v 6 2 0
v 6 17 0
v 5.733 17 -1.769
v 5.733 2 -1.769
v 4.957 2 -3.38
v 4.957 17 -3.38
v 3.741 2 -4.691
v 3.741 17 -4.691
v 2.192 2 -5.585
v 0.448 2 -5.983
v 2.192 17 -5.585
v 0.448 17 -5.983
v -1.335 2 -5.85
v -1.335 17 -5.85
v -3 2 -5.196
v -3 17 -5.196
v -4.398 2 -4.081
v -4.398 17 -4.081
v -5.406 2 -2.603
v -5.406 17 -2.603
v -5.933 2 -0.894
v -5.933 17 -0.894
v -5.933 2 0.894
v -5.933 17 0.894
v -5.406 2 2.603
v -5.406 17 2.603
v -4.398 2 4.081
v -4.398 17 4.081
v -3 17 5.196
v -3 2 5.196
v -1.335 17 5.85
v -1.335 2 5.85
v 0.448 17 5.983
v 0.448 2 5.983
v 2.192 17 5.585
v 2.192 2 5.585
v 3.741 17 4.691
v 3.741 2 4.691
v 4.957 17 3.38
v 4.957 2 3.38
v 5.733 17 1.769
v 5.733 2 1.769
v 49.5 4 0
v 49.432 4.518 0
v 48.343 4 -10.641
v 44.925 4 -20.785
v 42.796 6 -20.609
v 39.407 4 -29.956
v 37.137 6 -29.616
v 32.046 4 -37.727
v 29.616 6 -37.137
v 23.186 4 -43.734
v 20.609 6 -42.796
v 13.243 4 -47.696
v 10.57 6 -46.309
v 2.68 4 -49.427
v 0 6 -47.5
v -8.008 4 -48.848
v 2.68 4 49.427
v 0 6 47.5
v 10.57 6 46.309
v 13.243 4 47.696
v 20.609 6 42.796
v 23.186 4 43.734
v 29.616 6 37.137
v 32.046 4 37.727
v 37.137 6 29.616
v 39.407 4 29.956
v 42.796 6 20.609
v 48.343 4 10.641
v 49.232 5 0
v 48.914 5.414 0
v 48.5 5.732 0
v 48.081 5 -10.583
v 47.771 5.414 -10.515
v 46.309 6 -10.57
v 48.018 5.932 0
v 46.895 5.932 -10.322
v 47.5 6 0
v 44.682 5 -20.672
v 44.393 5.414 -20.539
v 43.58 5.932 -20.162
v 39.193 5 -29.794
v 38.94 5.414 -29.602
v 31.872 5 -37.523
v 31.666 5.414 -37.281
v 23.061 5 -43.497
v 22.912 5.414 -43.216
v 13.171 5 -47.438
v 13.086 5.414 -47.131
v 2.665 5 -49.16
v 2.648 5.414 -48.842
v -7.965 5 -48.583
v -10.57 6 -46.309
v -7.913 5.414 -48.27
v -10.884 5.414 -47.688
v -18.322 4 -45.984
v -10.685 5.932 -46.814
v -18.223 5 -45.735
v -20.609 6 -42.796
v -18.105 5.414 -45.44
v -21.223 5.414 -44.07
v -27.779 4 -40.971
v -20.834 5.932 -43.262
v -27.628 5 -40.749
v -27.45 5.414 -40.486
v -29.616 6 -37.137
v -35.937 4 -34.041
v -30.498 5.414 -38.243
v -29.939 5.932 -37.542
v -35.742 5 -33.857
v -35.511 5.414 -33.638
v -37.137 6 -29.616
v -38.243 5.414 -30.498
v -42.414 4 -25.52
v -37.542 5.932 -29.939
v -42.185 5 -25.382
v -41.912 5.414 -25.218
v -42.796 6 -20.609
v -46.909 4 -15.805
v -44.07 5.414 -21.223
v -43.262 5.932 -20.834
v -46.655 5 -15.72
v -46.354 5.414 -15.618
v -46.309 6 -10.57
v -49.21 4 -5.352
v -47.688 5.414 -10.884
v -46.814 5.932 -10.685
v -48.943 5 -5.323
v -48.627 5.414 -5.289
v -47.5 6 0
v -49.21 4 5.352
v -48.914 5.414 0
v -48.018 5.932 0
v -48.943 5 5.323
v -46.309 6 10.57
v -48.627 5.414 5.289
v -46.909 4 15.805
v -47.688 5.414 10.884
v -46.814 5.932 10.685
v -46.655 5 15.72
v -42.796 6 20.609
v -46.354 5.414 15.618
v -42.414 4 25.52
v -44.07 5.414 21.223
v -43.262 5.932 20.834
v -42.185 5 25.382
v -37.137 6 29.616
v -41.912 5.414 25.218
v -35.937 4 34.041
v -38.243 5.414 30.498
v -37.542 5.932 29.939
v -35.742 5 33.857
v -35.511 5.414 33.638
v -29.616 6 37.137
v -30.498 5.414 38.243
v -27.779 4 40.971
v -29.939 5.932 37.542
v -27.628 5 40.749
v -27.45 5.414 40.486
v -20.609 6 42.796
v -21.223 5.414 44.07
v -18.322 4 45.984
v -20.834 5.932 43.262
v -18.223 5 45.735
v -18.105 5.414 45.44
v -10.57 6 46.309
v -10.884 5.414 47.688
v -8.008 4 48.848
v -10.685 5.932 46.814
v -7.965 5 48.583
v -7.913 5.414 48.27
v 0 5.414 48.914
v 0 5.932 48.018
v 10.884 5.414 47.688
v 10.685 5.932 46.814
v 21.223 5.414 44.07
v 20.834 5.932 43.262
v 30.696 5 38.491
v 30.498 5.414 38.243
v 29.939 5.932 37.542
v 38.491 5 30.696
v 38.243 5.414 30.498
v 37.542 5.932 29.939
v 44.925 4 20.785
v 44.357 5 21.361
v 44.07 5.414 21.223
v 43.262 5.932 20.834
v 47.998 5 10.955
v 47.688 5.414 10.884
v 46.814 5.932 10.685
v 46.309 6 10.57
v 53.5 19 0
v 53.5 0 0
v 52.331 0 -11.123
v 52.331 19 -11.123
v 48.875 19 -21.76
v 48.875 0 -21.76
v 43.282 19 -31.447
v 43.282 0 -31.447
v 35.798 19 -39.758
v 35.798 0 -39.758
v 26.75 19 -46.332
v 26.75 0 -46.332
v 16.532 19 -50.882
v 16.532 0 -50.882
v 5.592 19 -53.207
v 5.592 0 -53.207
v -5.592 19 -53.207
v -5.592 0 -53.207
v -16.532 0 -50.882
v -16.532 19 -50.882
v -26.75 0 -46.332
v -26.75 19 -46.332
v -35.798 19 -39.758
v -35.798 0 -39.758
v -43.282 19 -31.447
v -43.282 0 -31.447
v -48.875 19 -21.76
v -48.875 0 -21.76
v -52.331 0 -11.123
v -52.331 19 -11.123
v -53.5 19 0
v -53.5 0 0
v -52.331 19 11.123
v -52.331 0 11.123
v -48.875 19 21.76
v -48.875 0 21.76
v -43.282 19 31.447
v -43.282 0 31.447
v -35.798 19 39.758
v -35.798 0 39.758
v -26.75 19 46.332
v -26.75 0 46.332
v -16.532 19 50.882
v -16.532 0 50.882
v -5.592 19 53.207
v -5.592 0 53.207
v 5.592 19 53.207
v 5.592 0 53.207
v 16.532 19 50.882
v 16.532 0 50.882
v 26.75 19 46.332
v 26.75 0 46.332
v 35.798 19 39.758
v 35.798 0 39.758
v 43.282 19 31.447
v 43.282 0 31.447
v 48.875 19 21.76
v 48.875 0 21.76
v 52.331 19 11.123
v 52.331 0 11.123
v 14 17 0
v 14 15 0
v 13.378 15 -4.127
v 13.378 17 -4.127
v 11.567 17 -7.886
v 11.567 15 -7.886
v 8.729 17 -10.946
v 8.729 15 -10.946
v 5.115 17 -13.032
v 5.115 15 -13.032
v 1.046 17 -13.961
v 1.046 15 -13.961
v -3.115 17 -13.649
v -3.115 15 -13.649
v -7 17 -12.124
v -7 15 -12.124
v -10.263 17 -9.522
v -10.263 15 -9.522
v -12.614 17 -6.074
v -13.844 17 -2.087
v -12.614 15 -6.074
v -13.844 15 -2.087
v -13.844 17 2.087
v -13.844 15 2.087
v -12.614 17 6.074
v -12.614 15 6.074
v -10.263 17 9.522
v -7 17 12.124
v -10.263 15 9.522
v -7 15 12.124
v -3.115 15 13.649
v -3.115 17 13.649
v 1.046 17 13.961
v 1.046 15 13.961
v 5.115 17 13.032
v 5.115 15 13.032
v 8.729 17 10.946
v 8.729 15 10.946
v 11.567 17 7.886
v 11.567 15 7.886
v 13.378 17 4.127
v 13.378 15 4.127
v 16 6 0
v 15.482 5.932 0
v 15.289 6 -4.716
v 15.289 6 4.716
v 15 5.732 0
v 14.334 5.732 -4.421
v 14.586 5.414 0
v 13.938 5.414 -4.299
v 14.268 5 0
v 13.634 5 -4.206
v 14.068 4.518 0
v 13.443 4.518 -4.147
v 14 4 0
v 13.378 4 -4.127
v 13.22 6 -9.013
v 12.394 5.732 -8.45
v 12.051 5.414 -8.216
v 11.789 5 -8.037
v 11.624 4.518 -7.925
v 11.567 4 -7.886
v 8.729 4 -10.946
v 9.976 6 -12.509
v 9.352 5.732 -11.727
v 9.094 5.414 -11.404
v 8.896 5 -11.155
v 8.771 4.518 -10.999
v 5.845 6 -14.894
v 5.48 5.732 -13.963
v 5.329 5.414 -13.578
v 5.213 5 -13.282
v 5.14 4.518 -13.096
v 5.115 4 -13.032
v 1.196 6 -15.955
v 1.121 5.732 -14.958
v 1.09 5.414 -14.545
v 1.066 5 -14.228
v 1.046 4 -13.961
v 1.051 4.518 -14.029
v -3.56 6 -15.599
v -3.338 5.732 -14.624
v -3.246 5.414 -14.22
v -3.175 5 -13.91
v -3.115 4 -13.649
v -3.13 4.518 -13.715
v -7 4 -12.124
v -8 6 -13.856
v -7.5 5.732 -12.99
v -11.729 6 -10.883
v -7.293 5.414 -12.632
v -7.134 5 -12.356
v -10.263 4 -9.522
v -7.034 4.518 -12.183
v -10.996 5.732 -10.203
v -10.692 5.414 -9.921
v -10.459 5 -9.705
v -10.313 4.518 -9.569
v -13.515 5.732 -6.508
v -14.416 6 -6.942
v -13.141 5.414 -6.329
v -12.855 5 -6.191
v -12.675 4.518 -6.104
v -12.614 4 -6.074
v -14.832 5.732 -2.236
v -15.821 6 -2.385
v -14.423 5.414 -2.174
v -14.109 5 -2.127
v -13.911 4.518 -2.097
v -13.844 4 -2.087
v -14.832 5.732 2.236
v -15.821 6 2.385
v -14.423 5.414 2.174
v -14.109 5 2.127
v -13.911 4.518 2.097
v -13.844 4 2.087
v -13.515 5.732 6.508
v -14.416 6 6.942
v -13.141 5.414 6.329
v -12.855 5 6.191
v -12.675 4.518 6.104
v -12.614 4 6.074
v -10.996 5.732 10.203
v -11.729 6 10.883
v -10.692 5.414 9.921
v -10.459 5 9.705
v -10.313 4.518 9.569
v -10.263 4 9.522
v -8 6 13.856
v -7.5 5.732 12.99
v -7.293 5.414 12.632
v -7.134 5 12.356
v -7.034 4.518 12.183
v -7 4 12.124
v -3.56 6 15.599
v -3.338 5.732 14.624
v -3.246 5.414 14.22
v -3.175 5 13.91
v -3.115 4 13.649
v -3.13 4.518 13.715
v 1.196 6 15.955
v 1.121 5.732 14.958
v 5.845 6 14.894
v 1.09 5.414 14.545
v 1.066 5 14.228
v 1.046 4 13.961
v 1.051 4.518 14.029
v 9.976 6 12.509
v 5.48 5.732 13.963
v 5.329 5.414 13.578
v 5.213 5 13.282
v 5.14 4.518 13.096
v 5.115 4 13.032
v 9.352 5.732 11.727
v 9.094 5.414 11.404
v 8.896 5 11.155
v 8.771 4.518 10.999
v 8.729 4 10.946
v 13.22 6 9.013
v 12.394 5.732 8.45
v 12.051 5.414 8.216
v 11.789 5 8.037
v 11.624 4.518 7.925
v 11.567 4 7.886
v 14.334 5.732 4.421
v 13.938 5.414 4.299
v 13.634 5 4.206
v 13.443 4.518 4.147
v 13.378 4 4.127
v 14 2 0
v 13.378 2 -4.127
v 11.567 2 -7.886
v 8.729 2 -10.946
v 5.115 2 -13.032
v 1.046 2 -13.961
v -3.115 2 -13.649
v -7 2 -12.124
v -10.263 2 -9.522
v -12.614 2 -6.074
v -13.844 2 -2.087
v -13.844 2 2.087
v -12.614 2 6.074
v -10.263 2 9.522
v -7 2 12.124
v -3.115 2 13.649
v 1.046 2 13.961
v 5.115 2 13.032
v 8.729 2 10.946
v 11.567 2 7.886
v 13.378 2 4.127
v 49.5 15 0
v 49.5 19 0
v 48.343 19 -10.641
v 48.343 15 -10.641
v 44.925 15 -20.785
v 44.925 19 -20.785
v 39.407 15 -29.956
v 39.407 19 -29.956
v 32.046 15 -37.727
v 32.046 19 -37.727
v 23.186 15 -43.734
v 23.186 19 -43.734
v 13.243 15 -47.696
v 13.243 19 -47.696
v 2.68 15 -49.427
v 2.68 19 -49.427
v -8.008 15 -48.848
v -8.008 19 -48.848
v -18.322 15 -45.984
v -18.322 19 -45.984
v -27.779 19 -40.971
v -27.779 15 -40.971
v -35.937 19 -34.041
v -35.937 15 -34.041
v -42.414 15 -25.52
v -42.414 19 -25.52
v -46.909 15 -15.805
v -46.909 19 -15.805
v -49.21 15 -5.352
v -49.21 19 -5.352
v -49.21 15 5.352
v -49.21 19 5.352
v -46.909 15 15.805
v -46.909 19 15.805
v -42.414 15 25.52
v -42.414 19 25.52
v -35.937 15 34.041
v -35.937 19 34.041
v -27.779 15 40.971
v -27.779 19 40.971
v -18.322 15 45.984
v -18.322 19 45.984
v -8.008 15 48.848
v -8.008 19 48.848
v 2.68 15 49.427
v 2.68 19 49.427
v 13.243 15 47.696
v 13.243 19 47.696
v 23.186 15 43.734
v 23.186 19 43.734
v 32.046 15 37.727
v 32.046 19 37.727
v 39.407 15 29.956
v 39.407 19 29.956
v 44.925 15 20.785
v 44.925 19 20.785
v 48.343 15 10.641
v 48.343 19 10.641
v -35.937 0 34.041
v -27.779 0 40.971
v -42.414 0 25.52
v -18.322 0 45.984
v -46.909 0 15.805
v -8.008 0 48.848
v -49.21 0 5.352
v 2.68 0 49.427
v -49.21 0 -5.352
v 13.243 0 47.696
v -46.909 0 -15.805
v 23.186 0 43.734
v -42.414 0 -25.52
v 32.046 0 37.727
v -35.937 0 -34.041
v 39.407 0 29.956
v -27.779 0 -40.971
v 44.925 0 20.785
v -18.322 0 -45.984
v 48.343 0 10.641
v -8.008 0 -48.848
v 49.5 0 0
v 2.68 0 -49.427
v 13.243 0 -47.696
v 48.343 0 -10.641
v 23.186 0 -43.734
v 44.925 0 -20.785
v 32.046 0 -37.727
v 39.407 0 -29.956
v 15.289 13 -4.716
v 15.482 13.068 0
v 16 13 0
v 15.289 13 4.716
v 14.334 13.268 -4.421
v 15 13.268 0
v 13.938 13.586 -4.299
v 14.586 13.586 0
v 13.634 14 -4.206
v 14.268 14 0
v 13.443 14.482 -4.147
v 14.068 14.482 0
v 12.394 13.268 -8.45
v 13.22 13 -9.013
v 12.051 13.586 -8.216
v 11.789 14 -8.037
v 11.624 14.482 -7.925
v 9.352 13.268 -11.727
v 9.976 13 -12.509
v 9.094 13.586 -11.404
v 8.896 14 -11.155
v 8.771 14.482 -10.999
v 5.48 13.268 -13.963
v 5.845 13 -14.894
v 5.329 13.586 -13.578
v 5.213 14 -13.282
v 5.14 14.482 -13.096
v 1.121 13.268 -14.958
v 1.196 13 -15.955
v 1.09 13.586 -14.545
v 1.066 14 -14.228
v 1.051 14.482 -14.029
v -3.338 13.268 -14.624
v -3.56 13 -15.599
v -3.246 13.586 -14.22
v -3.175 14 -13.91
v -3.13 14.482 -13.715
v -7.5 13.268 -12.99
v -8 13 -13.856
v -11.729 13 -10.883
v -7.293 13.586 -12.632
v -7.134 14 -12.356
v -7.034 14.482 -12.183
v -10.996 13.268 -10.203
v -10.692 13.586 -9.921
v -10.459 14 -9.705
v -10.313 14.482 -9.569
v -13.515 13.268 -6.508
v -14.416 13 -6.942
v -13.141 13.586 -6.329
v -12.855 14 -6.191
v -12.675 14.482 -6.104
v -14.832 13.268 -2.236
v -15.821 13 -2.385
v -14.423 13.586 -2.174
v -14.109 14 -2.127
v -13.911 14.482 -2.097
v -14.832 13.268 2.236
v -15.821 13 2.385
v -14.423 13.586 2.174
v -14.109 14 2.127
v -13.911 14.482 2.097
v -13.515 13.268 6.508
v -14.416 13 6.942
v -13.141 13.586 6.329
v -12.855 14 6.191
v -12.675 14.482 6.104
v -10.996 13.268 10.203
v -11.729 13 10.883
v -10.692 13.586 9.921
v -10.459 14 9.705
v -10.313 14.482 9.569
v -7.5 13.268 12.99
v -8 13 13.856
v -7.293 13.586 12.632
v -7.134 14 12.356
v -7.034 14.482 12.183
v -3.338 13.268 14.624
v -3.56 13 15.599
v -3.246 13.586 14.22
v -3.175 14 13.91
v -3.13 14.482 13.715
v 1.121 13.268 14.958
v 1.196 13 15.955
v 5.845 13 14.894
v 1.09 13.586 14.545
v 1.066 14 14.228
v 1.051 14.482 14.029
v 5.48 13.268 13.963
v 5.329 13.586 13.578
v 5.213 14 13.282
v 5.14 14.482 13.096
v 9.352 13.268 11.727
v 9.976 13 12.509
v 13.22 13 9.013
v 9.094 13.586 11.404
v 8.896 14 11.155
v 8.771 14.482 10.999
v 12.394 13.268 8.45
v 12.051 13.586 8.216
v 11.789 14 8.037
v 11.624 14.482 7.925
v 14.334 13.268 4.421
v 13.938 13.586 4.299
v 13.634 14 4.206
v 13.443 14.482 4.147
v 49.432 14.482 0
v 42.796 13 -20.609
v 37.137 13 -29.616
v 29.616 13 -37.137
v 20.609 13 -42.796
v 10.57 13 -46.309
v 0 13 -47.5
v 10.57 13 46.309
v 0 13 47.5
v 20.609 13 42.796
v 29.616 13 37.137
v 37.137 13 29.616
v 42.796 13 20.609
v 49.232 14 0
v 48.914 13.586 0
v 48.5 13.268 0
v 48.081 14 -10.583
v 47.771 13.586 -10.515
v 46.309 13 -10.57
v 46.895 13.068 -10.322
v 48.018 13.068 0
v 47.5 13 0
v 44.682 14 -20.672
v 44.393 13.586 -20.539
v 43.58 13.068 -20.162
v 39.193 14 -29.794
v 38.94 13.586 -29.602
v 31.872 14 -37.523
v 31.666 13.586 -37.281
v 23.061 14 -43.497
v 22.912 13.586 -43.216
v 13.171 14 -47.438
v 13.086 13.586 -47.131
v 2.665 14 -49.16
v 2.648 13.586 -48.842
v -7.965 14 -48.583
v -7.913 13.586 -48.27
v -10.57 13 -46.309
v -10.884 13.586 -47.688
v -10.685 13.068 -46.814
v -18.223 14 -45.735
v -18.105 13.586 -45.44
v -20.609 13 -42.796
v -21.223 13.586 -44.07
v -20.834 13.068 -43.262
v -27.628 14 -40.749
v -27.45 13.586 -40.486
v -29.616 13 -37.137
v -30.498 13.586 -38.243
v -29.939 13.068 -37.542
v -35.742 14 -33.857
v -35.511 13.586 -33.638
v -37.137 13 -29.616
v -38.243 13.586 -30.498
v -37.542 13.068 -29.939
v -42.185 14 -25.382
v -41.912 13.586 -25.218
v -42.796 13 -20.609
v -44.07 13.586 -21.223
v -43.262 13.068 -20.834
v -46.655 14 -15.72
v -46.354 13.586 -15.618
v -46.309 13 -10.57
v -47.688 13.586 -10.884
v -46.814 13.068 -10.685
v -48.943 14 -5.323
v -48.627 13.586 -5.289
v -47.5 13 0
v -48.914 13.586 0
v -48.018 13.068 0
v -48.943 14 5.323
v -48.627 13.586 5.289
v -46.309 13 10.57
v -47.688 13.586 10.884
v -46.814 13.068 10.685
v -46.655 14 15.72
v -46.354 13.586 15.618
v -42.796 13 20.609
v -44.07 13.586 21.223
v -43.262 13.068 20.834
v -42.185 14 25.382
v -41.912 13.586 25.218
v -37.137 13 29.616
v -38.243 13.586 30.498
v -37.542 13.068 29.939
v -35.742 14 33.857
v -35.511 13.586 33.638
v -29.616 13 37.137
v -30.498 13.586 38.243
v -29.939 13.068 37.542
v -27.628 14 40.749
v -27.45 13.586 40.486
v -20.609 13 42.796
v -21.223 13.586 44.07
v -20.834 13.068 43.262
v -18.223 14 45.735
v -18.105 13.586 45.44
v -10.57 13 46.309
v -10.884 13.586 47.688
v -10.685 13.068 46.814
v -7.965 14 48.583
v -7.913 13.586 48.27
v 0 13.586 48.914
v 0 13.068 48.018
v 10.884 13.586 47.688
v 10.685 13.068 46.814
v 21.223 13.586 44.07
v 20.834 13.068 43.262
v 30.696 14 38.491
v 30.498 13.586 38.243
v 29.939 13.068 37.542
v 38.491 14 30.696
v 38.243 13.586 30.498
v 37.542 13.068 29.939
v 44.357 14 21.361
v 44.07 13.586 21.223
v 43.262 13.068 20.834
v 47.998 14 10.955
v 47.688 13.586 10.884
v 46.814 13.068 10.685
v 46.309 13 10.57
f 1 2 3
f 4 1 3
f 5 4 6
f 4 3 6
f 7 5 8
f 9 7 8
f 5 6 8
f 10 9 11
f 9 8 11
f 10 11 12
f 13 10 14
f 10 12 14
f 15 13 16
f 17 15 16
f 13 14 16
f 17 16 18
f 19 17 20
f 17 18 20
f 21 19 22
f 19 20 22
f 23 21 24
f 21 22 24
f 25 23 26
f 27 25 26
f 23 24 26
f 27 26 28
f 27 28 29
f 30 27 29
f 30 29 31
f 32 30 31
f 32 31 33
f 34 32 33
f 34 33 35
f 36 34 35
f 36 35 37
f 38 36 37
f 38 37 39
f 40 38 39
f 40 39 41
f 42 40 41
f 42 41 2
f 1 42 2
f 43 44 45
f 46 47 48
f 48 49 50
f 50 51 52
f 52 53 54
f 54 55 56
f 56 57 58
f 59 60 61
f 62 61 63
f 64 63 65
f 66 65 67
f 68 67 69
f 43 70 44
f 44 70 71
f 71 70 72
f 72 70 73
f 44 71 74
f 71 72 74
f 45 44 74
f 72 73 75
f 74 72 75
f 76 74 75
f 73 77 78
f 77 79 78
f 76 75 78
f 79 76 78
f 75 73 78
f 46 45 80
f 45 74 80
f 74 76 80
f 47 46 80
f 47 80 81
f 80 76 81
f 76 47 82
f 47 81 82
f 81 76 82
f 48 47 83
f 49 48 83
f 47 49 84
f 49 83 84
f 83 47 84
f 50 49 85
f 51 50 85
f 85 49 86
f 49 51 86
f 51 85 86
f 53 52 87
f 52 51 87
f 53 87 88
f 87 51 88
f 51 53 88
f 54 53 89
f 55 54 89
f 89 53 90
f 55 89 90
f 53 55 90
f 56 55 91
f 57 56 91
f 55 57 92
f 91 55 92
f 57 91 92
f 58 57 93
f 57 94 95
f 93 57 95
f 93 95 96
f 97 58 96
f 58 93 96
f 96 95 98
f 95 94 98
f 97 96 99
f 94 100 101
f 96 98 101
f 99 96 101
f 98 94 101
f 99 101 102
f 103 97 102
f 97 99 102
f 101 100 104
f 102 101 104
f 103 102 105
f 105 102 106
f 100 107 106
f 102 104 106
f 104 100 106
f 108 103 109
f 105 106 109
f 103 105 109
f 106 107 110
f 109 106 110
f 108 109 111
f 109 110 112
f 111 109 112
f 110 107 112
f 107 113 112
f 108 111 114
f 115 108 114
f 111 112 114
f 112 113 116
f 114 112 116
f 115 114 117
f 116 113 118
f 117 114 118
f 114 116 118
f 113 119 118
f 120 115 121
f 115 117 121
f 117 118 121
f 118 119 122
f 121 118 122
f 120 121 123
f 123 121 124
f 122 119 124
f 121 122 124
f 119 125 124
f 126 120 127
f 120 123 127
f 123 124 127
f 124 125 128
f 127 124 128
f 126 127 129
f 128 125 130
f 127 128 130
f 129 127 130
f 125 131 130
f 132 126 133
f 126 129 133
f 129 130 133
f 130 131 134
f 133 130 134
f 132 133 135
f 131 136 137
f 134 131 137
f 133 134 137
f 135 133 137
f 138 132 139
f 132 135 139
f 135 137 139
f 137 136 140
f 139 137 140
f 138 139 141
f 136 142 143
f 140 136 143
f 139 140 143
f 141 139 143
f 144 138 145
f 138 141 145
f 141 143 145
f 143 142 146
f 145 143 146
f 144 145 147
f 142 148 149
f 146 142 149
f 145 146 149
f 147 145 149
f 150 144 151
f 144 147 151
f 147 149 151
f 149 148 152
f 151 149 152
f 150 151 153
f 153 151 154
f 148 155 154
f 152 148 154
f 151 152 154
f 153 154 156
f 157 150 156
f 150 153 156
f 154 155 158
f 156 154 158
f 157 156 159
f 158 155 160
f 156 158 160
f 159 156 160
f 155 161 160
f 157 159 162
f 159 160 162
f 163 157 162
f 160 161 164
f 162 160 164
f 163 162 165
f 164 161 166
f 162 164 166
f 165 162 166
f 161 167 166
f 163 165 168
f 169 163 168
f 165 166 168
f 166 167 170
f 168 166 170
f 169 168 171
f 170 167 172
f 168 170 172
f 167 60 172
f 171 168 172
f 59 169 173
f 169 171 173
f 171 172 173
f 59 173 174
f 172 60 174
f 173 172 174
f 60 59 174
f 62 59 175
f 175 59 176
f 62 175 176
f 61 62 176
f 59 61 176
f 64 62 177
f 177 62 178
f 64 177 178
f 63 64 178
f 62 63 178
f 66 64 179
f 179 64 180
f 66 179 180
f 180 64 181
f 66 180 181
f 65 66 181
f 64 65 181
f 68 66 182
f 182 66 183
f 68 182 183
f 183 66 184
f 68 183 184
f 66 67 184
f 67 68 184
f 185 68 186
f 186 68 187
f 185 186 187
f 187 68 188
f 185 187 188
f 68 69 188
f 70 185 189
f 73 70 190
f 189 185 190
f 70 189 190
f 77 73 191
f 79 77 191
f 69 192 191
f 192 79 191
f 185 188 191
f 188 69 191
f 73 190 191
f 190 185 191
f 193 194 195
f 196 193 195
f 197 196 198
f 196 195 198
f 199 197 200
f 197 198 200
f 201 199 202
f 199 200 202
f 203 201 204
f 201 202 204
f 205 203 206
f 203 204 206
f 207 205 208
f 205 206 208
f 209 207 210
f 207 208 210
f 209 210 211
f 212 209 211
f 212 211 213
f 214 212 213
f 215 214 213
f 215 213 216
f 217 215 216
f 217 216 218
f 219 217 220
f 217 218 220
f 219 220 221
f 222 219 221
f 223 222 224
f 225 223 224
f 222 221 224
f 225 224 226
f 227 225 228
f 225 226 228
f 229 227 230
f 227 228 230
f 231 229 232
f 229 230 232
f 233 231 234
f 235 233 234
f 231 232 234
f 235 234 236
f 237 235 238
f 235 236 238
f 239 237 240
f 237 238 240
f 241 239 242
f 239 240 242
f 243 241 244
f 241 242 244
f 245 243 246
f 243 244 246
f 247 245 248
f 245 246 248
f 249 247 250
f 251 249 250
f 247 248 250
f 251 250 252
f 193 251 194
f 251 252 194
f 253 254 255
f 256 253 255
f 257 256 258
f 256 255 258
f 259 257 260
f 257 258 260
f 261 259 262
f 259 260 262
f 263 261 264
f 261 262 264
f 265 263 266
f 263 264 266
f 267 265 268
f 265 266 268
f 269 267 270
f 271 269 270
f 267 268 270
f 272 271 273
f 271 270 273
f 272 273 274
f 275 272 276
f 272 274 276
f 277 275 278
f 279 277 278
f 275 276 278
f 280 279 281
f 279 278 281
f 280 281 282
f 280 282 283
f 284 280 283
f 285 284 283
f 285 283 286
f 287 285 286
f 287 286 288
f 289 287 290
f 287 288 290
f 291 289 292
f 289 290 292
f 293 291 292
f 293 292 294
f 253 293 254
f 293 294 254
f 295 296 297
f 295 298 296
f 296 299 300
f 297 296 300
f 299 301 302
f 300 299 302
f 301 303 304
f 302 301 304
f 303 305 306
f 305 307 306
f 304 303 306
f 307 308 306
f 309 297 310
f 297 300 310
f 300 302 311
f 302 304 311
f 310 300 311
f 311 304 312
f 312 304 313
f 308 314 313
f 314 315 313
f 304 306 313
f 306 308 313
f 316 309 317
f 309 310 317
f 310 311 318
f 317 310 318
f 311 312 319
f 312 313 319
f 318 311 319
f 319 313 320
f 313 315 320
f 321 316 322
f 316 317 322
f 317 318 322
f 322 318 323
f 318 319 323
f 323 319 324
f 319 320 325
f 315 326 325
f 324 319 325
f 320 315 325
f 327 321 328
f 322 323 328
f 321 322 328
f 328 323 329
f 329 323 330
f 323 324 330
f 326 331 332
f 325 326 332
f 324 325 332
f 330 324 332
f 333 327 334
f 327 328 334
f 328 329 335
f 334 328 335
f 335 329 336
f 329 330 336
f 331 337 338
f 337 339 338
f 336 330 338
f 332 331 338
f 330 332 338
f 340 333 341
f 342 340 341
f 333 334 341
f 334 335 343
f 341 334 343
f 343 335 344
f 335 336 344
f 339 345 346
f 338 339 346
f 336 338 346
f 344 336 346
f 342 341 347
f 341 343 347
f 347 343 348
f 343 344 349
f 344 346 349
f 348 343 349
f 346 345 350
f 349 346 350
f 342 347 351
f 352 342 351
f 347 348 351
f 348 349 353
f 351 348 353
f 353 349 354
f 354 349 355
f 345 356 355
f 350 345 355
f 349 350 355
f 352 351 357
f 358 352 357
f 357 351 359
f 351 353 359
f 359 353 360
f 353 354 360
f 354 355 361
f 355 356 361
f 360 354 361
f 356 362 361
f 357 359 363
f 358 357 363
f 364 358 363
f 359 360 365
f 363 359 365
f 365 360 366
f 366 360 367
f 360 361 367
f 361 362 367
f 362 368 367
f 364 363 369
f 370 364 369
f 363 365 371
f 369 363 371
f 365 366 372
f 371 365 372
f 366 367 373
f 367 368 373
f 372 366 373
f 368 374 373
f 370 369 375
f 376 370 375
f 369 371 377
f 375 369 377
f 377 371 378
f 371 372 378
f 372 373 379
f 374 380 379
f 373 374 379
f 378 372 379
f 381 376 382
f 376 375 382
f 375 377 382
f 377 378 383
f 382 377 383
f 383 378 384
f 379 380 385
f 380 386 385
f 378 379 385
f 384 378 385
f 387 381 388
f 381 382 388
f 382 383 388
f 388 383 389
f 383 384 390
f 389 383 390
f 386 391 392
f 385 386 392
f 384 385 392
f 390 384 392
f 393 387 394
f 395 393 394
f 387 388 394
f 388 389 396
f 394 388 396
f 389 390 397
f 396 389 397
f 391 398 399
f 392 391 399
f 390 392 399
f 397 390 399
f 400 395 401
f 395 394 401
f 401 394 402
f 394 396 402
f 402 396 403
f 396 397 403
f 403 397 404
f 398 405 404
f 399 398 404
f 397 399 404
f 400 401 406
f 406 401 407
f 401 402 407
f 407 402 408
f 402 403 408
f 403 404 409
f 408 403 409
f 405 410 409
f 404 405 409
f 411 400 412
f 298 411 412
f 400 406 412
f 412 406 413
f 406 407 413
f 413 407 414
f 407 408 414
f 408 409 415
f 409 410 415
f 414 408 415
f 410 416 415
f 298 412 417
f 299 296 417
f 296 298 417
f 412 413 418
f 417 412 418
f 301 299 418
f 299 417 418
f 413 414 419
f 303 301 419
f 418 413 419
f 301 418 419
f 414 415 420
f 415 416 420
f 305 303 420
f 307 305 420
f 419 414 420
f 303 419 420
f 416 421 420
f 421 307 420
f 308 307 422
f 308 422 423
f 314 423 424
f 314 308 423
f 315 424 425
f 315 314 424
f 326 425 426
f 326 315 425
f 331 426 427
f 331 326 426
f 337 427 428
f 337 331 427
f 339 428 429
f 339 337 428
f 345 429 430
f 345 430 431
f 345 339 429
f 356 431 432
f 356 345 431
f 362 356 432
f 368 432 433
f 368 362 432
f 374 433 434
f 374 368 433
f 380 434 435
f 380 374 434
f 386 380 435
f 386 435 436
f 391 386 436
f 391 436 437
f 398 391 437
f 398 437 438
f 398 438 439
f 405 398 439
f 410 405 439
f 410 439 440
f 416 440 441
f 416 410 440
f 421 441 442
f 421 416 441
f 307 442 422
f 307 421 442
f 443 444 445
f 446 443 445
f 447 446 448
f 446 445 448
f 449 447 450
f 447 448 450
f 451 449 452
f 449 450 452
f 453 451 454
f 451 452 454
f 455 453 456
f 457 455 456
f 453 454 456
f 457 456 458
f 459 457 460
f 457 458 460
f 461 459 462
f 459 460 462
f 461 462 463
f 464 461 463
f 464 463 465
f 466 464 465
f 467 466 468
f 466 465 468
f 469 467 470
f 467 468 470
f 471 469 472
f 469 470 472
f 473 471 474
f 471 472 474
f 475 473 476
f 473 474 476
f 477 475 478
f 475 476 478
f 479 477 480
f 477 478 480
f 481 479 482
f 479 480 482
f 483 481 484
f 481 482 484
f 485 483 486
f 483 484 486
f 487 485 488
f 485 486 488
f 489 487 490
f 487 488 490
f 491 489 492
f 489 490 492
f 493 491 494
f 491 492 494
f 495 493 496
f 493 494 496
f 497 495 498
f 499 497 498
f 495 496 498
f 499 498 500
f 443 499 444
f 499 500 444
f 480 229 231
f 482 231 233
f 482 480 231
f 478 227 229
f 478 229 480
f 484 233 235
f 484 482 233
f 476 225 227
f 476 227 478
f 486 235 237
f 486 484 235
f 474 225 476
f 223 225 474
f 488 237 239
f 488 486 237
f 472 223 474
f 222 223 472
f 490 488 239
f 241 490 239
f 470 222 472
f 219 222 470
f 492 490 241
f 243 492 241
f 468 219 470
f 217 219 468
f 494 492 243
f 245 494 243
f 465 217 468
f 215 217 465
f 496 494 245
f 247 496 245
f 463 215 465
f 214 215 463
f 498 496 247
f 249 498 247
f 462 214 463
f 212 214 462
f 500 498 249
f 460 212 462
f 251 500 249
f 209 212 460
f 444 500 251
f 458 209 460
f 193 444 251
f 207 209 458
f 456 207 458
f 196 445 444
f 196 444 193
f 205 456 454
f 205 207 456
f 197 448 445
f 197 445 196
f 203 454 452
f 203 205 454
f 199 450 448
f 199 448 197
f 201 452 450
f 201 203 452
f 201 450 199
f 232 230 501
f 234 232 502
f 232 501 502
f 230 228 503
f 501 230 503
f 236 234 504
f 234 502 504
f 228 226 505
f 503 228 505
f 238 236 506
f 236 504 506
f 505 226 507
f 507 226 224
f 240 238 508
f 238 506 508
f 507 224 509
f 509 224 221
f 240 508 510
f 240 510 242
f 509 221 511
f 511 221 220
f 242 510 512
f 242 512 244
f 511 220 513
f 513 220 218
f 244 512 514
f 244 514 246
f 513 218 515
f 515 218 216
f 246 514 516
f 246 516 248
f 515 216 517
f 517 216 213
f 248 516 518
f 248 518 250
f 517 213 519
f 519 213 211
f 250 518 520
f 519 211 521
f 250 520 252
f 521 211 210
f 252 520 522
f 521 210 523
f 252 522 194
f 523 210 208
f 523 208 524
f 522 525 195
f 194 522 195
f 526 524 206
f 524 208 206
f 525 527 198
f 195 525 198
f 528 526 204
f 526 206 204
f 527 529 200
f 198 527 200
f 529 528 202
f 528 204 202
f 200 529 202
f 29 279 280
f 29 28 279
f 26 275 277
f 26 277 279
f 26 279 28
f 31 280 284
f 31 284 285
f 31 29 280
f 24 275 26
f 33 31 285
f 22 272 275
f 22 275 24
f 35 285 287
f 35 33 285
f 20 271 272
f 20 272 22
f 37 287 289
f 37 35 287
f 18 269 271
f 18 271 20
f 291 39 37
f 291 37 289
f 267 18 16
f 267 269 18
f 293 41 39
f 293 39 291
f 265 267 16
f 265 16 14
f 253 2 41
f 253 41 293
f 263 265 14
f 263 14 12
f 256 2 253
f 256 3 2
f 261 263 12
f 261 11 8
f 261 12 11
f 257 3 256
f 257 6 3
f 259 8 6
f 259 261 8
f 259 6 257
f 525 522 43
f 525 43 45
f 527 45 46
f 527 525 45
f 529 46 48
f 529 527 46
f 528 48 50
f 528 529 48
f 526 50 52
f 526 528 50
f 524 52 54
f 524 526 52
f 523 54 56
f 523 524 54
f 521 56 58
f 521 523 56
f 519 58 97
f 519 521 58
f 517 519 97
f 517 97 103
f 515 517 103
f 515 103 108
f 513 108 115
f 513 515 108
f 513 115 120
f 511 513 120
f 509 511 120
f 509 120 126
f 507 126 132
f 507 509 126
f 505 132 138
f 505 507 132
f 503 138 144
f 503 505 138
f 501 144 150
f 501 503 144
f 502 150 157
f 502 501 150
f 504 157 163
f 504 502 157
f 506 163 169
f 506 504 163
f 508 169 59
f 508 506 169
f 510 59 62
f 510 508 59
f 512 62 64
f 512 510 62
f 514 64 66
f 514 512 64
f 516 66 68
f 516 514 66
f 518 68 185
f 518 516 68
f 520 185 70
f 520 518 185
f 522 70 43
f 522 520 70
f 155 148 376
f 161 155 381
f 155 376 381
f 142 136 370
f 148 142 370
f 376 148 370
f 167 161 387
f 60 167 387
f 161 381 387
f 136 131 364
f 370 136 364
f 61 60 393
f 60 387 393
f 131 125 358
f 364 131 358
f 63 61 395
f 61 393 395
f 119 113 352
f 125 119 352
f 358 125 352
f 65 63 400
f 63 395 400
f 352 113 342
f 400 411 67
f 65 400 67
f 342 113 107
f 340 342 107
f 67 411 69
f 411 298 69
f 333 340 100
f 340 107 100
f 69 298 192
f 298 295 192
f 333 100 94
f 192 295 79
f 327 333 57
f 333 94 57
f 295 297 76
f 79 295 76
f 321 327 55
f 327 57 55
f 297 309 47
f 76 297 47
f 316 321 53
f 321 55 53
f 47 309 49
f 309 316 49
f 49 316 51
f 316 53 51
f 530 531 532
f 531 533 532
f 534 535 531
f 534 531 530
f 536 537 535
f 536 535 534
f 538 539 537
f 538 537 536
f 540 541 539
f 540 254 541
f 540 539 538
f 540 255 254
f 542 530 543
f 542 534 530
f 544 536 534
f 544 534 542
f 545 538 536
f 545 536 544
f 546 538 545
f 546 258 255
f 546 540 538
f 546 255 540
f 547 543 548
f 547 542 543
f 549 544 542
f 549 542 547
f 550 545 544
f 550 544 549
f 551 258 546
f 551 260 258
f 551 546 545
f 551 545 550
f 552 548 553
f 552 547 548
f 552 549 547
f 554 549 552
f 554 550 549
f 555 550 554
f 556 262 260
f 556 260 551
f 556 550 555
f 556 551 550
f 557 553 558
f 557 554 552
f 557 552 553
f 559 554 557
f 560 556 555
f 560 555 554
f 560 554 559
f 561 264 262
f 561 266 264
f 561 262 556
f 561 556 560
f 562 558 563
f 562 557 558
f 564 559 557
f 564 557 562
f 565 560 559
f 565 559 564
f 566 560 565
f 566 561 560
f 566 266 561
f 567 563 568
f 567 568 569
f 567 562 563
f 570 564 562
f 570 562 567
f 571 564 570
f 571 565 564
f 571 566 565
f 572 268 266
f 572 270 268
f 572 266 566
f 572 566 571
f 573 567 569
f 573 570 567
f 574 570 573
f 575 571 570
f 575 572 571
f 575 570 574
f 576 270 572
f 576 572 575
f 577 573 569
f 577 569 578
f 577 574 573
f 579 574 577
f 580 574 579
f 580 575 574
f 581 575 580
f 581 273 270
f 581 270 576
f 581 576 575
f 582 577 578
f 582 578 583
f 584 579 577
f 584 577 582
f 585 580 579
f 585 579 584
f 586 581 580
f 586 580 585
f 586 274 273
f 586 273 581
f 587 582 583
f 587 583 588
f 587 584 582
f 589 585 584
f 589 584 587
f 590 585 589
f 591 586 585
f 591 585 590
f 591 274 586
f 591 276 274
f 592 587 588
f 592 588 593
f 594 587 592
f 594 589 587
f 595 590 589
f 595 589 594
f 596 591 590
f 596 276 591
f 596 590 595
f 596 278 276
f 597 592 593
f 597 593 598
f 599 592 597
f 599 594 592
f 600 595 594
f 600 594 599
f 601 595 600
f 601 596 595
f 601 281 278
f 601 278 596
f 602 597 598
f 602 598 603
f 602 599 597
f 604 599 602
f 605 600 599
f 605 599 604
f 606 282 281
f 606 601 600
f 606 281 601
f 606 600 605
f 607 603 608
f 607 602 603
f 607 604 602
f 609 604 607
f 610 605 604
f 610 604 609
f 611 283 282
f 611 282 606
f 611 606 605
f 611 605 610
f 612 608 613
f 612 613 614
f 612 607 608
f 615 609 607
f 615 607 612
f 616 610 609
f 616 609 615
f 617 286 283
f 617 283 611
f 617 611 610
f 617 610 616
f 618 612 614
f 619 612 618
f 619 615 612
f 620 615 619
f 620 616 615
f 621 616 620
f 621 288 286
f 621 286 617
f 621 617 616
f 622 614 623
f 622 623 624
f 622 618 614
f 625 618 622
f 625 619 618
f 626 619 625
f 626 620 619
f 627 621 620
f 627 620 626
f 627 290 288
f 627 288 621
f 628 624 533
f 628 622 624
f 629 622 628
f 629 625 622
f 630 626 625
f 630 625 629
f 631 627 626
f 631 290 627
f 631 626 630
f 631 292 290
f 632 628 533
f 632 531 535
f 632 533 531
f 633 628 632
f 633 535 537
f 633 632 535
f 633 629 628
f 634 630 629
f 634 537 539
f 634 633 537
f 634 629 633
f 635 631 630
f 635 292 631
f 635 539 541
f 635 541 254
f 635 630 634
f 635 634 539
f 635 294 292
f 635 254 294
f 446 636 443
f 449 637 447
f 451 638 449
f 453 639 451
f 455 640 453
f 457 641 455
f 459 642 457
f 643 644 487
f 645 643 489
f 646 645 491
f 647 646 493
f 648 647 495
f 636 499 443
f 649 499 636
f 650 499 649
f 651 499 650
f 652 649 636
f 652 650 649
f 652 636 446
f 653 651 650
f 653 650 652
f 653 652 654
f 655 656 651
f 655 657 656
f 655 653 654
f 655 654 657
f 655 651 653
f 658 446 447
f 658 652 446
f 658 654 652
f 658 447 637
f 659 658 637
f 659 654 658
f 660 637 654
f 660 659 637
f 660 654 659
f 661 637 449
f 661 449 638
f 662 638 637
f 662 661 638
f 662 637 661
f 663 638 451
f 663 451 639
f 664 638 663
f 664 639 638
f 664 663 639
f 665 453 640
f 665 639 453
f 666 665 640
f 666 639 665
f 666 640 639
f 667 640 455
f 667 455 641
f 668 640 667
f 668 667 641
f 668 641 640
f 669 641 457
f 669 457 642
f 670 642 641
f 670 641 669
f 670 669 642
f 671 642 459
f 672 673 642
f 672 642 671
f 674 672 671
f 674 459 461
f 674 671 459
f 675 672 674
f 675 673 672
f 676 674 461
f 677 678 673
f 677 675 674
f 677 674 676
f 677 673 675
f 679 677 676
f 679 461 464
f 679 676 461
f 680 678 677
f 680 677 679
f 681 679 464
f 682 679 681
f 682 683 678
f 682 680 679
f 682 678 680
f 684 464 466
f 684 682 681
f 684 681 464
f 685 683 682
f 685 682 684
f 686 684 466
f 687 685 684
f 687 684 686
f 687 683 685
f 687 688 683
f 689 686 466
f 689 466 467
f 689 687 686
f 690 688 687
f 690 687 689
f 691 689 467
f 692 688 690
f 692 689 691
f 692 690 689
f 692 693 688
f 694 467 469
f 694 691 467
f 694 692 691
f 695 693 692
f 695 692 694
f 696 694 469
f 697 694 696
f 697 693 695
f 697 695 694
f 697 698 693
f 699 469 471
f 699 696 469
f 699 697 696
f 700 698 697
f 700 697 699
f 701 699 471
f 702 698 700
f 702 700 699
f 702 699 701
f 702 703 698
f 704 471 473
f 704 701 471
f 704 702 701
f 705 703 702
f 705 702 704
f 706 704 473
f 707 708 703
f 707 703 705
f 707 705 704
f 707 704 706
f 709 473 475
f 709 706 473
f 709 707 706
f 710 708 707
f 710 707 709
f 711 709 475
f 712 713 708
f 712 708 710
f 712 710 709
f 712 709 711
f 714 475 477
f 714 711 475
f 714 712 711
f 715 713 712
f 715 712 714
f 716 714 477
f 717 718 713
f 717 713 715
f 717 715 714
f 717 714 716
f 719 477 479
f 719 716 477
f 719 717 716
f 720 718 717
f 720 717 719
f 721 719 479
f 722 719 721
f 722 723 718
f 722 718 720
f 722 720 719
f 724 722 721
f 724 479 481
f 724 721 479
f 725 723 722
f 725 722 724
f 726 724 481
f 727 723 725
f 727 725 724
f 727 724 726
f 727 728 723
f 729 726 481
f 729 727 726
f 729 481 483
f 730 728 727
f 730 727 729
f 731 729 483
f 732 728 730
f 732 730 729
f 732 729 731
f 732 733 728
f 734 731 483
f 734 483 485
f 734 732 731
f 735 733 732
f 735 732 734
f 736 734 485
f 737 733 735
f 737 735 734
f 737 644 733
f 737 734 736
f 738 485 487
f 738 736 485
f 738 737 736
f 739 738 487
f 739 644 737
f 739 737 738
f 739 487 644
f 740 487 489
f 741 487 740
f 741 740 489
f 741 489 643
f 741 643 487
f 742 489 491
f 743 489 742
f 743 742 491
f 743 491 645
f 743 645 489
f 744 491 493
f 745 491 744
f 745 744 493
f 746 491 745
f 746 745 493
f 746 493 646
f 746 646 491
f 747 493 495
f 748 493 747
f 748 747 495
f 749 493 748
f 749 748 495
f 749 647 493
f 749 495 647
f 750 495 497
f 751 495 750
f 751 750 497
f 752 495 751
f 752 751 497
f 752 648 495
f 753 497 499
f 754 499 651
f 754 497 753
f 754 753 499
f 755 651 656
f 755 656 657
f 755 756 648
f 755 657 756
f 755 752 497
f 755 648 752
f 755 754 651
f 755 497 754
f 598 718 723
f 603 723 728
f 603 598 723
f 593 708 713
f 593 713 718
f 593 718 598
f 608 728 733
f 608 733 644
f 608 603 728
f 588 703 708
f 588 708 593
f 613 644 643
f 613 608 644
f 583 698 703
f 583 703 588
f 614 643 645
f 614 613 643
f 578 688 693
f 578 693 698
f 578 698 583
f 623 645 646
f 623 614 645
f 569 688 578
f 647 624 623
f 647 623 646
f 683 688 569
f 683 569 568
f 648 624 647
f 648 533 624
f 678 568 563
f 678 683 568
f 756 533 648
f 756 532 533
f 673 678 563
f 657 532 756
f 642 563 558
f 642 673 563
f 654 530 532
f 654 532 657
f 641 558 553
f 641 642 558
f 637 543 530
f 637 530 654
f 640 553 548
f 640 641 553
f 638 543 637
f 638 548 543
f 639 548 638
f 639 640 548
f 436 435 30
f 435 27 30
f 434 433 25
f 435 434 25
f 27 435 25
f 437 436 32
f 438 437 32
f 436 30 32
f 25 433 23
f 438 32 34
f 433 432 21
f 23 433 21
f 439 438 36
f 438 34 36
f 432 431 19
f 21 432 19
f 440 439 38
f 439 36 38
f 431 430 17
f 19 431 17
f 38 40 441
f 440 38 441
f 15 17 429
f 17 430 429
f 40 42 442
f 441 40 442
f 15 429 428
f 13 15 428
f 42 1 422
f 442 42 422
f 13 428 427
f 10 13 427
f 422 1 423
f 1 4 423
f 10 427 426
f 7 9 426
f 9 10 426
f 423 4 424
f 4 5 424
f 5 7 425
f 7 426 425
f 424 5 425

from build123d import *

# Parameters (mm, degrees)
SKETCH1_R            = 53.5
BOSS_EXTRUDE1_DEPTH  = 19
SKETCH2_R            = 49.5
CUT_EXTRUDE1_DEPTH   = 6
FILLET1_R            = 2
SKETCH3_R            = 14
BOSS_EXTRUDE2_DEPTH  = 4
FILLET2_R            = 2
FILLET1_OF_MIRROR1_R = 2
FILLET2_OF_MIRROR1_R = 2
SKETCH5_R            = 6
CUT_EXTRUDE2_DEPTH   = 18


with BuildPart() as part:
    # Sketch1 → Boss-Extrude1 (new body)
    with BuildSketch(Plane(origin=(0, 0, 0), x_dir=(1, 0, 0), z_dir=(0, 1, 0))):
        Circle(SKETCH1_R)
    extrude(amount=BOSS_EXTRUDE1_DEPTH)

    # Sketch2 → Cut-Extrude1 (cut)
    with BuildSketch(Plane(origin=(0, 19, 0), x_dir=(1, 0, 0), z_dir=(0, 1, 0))):
        Circle(SKETCH2_R)
    cut_extrude1 = extrude(amount=-CUT_EXTRUDE1_DEPTH, mode=Mode.SUBTRACT)

    # Fillet1
    fillet1_edges = [part.edges().sort_by_distance(p)[0] for p in [
        (-49.5, 13, 0),
    ]]
    fillet(fillet1_edges, radius=FILLET1_R)

    # Sketch3 → Boss-Extrude2 (add)
    with BuildSketch(Plane(origin=(0, 13, 0), x_dir=(1, 0, 0), z_dir=(0, 1, 0))):
        Circle(SKETCH3_R)
    boss_extrude2 = extrude(amount=BOSS_EXTRUDE2_DEPTH)

    # Fillet2
    fillet2_edges = [part.edges().sort_by_distance(p)[0] for p in [
        (-14, 13, 0),
    ]]
    fillet(fillet2_edges, radius=FILLET2_R)

    # Mirror1: Cut-Extrude1, Boss-Extrude2 across plane
    add(cut_extrude1.mirror(Plane.ZX.offset(9.5)), mode=Mode.SUBTRACT)
    add(boss_extrude2.mirror(Plane.ZX.offset(9.5)))

    # Fillet1 of Mirror1
    fillet1_of_mirror1_edges = [part.edges().sort_by_distance(p)[0] for p in [
        (-49.5, 6, 0),
    ]]
    fillet(fillet1_of_mirror1_edges, radius=FILLET1_OF_MIRROR1_R)

    # Fillet2 of Mirror1
    fillet2_of_mirror1_edges = [part.edges().sort_by_distance(p)[0] for p in [
        (-14, 6, 0),
    ]]
    fillet(fillet2_of_mirror1_edges, radius=FILLET2_OF_MIRROR1_R)

    # Sketch5 → Cut-Extrude2 (cut, through all)
    with BuildSketch(Plane(origin=(0, 17, 0), x_dir=(1, 0, 0), z_dir=(0, 1, 0))):
        Circle(SKETCH5_R)
    extrude(amount=-CUT_EXTRUDE2_DEPTH, mode=Mode.SUBTRACT)


solid = part.part
